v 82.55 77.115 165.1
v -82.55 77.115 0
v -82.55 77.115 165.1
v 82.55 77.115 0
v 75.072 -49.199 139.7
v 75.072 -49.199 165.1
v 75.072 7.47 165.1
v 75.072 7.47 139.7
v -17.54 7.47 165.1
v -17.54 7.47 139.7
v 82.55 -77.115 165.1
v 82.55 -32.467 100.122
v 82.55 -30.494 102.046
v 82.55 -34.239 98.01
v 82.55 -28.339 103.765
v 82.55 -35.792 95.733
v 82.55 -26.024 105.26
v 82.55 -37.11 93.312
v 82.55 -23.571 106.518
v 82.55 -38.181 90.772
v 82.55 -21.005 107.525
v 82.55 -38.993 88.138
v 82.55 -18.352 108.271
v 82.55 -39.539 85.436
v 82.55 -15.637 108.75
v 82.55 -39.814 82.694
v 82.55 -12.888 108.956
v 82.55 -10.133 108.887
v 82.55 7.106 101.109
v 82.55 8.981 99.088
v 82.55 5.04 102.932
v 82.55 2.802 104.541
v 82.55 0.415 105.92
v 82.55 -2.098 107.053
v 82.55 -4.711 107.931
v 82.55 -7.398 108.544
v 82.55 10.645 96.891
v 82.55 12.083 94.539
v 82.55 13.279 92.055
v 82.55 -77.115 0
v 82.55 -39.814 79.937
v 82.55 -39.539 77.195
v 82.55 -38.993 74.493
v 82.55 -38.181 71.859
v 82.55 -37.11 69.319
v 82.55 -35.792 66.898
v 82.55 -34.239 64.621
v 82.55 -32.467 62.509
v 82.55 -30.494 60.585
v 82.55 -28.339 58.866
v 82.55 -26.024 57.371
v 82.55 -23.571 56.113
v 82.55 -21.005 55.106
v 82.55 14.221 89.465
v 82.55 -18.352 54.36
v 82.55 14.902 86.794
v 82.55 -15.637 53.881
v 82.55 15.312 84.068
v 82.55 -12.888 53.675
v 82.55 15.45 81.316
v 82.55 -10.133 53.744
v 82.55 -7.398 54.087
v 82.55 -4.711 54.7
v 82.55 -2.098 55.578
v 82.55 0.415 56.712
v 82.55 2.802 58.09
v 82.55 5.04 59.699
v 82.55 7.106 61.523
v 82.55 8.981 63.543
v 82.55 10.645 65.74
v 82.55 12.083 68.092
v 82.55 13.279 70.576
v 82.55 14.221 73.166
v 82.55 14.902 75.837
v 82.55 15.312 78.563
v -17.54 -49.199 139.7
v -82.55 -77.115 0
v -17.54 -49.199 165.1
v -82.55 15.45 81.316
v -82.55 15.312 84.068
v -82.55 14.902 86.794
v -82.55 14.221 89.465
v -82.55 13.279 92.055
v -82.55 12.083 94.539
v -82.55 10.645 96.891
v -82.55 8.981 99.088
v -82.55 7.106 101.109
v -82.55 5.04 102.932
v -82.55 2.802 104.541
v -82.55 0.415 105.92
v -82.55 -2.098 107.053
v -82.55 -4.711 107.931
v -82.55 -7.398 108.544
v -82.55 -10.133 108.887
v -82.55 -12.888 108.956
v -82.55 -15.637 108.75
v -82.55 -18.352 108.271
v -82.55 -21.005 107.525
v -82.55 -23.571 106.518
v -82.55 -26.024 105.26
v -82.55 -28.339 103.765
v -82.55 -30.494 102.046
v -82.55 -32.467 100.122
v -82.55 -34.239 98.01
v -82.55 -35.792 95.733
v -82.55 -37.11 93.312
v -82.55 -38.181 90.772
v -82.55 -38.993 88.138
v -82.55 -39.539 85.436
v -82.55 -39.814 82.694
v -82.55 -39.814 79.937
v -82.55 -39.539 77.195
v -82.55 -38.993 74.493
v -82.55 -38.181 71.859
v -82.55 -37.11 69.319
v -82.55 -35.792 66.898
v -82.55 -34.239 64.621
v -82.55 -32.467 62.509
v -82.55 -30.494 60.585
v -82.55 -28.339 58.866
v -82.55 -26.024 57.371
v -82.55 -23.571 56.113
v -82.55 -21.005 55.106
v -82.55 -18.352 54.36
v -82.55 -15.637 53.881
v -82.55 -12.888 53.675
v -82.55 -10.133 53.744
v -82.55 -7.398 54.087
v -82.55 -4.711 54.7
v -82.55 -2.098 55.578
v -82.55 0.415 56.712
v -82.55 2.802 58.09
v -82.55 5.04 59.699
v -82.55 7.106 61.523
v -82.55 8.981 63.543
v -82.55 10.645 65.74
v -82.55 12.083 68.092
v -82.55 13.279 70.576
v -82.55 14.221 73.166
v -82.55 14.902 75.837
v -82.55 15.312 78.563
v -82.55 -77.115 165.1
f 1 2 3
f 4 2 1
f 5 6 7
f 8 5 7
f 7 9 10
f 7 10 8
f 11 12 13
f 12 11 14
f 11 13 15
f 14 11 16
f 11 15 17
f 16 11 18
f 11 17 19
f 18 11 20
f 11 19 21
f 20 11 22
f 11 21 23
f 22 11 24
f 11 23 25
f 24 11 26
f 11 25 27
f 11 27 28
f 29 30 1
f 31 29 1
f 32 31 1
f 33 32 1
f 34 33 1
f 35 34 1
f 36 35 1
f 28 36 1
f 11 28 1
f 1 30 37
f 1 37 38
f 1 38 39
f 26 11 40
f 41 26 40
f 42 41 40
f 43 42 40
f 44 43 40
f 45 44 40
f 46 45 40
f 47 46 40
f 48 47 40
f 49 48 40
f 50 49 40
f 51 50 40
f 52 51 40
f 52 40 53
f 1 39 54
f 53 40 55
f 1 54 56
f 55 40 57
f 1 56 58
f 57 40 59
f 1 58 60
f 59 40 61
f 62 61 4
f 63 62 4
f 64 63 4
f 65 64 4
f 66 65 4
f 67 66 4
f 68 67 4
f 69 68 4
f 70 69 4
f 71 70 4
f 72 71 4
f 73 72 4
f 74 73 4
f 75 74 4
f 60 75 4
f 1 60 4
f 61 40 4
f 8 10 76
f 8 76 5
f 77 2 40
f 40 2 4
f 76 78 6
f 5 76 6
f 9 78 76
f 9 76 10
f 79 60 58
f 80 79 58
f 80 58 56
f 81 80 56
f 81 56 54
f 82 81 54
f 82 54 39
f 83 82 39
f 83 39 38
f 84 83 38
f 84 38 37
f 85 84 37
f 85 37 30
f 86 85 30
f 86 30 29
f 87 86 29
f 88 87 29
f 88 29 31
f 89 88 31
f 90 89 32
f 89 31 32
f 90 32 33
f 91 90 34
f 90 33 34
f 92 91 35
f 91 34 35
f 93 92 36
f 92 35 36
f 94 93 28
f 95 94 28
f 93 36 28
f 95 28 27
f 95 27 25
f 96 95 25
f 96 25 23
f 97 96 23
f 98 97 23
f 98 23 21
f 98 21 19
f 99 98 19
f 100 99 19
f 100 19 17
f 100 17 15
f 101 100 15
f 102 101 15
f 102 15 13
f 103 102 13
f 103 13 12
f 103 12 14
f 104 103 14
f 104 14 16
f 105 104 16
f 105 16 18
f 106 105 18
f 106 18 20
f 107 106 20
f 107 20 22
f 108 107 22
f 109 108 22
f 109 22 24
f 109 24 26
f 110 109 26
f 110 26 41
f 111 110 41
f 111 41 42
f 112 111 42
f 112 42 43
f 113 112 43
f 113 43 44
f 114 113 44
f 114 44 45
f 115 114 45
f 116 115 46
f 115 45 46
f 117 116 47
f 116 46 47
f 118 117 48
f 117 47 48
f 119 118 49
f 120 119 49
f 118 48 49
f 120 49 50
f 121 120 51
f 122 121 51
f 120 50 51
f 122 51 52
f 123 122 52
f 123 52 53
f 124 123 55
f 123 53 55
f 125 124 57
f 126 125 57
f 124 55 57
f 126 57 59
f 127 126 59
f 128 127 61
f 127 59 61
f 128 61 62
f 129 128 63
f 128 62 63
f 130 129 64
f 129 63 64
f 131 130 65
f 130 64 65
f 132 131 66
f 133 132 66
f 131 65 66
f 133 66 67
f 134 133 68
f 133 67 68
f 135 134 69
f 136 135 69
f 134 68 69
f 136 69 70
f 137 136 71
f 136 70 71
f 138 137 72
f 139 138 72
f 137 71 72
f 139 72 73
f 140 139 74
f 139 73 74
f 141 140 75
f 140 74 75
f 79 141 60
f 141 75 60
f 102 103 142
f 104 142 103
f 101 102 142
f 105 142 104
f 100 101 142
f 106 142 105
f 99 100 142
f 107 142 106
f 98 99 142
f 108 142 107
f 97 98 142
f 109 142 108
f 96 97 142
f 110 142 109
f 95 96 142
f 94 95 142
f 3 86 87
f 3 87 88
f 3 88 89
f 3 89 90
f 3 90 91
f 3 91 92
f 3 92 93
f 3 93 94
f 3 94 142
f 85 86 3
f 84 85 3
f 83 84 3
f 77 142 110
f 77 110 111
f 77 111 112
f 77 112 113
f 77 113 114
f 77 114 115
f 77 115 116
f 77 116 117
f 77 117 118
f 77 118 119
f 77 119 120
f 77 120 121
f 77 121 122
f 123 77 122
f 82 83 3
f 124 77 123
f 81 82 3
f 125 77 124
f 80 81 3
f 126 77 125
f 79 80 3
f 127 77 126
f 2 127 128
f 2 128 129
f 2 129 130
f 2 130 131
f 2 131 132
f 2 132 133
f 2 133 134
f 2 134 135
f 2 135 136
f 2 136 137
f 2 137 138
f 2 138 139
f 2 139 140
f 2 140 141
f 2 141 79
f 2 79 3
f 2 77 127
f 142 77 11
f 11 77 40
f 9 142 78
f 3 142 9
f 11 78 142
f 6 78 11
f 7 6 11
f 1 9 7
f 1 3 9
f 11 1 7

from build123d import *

# Parameters (mm, degrees)
F1_W     = 165.1
F1_H     = 154.2292288029
F2_DEPTH = 165.1
F3_R     = 27.6489440809
F4_DEPTH = 247.396
F5_W     = 92.6118567586
F5_H     = 56.6696990281
F6_DEPTH = 25.4


# Not quite as in the source:
# - a variable given as a bare number and used for a length is read in inches; the dataset says mm whatever the document's units were


with BuildPart() as f2:
    # F1 (on Top) → F2 (new body)
    with BuildSketch(Plane.XY):
        Rectangle(F1_W, F1_H)
    extrude(amount=F2_DEPTH)

    # F3 (on face) → F4 (cut)
    with BuildSketch(Plane.YZ.offset(82.55)):
        with Locations((-12.199181132, 81.3155397773)):
            Circle(F3_R)
    extrude(amount=-F4_DEPTH, mode=Mode.SUBTRACT)

    # F5 (on face) → F6 (cut)
    with BuildSketch(Plane.XY.offset(165.1)):
        with Locations((28.7659913301, -20.8643507212)):
            Rectangle(F5_W, F5_H)
    extrude(amount=-F6_DEPTH, mode=Mode.SUBTRACT)


solid = f2.part
